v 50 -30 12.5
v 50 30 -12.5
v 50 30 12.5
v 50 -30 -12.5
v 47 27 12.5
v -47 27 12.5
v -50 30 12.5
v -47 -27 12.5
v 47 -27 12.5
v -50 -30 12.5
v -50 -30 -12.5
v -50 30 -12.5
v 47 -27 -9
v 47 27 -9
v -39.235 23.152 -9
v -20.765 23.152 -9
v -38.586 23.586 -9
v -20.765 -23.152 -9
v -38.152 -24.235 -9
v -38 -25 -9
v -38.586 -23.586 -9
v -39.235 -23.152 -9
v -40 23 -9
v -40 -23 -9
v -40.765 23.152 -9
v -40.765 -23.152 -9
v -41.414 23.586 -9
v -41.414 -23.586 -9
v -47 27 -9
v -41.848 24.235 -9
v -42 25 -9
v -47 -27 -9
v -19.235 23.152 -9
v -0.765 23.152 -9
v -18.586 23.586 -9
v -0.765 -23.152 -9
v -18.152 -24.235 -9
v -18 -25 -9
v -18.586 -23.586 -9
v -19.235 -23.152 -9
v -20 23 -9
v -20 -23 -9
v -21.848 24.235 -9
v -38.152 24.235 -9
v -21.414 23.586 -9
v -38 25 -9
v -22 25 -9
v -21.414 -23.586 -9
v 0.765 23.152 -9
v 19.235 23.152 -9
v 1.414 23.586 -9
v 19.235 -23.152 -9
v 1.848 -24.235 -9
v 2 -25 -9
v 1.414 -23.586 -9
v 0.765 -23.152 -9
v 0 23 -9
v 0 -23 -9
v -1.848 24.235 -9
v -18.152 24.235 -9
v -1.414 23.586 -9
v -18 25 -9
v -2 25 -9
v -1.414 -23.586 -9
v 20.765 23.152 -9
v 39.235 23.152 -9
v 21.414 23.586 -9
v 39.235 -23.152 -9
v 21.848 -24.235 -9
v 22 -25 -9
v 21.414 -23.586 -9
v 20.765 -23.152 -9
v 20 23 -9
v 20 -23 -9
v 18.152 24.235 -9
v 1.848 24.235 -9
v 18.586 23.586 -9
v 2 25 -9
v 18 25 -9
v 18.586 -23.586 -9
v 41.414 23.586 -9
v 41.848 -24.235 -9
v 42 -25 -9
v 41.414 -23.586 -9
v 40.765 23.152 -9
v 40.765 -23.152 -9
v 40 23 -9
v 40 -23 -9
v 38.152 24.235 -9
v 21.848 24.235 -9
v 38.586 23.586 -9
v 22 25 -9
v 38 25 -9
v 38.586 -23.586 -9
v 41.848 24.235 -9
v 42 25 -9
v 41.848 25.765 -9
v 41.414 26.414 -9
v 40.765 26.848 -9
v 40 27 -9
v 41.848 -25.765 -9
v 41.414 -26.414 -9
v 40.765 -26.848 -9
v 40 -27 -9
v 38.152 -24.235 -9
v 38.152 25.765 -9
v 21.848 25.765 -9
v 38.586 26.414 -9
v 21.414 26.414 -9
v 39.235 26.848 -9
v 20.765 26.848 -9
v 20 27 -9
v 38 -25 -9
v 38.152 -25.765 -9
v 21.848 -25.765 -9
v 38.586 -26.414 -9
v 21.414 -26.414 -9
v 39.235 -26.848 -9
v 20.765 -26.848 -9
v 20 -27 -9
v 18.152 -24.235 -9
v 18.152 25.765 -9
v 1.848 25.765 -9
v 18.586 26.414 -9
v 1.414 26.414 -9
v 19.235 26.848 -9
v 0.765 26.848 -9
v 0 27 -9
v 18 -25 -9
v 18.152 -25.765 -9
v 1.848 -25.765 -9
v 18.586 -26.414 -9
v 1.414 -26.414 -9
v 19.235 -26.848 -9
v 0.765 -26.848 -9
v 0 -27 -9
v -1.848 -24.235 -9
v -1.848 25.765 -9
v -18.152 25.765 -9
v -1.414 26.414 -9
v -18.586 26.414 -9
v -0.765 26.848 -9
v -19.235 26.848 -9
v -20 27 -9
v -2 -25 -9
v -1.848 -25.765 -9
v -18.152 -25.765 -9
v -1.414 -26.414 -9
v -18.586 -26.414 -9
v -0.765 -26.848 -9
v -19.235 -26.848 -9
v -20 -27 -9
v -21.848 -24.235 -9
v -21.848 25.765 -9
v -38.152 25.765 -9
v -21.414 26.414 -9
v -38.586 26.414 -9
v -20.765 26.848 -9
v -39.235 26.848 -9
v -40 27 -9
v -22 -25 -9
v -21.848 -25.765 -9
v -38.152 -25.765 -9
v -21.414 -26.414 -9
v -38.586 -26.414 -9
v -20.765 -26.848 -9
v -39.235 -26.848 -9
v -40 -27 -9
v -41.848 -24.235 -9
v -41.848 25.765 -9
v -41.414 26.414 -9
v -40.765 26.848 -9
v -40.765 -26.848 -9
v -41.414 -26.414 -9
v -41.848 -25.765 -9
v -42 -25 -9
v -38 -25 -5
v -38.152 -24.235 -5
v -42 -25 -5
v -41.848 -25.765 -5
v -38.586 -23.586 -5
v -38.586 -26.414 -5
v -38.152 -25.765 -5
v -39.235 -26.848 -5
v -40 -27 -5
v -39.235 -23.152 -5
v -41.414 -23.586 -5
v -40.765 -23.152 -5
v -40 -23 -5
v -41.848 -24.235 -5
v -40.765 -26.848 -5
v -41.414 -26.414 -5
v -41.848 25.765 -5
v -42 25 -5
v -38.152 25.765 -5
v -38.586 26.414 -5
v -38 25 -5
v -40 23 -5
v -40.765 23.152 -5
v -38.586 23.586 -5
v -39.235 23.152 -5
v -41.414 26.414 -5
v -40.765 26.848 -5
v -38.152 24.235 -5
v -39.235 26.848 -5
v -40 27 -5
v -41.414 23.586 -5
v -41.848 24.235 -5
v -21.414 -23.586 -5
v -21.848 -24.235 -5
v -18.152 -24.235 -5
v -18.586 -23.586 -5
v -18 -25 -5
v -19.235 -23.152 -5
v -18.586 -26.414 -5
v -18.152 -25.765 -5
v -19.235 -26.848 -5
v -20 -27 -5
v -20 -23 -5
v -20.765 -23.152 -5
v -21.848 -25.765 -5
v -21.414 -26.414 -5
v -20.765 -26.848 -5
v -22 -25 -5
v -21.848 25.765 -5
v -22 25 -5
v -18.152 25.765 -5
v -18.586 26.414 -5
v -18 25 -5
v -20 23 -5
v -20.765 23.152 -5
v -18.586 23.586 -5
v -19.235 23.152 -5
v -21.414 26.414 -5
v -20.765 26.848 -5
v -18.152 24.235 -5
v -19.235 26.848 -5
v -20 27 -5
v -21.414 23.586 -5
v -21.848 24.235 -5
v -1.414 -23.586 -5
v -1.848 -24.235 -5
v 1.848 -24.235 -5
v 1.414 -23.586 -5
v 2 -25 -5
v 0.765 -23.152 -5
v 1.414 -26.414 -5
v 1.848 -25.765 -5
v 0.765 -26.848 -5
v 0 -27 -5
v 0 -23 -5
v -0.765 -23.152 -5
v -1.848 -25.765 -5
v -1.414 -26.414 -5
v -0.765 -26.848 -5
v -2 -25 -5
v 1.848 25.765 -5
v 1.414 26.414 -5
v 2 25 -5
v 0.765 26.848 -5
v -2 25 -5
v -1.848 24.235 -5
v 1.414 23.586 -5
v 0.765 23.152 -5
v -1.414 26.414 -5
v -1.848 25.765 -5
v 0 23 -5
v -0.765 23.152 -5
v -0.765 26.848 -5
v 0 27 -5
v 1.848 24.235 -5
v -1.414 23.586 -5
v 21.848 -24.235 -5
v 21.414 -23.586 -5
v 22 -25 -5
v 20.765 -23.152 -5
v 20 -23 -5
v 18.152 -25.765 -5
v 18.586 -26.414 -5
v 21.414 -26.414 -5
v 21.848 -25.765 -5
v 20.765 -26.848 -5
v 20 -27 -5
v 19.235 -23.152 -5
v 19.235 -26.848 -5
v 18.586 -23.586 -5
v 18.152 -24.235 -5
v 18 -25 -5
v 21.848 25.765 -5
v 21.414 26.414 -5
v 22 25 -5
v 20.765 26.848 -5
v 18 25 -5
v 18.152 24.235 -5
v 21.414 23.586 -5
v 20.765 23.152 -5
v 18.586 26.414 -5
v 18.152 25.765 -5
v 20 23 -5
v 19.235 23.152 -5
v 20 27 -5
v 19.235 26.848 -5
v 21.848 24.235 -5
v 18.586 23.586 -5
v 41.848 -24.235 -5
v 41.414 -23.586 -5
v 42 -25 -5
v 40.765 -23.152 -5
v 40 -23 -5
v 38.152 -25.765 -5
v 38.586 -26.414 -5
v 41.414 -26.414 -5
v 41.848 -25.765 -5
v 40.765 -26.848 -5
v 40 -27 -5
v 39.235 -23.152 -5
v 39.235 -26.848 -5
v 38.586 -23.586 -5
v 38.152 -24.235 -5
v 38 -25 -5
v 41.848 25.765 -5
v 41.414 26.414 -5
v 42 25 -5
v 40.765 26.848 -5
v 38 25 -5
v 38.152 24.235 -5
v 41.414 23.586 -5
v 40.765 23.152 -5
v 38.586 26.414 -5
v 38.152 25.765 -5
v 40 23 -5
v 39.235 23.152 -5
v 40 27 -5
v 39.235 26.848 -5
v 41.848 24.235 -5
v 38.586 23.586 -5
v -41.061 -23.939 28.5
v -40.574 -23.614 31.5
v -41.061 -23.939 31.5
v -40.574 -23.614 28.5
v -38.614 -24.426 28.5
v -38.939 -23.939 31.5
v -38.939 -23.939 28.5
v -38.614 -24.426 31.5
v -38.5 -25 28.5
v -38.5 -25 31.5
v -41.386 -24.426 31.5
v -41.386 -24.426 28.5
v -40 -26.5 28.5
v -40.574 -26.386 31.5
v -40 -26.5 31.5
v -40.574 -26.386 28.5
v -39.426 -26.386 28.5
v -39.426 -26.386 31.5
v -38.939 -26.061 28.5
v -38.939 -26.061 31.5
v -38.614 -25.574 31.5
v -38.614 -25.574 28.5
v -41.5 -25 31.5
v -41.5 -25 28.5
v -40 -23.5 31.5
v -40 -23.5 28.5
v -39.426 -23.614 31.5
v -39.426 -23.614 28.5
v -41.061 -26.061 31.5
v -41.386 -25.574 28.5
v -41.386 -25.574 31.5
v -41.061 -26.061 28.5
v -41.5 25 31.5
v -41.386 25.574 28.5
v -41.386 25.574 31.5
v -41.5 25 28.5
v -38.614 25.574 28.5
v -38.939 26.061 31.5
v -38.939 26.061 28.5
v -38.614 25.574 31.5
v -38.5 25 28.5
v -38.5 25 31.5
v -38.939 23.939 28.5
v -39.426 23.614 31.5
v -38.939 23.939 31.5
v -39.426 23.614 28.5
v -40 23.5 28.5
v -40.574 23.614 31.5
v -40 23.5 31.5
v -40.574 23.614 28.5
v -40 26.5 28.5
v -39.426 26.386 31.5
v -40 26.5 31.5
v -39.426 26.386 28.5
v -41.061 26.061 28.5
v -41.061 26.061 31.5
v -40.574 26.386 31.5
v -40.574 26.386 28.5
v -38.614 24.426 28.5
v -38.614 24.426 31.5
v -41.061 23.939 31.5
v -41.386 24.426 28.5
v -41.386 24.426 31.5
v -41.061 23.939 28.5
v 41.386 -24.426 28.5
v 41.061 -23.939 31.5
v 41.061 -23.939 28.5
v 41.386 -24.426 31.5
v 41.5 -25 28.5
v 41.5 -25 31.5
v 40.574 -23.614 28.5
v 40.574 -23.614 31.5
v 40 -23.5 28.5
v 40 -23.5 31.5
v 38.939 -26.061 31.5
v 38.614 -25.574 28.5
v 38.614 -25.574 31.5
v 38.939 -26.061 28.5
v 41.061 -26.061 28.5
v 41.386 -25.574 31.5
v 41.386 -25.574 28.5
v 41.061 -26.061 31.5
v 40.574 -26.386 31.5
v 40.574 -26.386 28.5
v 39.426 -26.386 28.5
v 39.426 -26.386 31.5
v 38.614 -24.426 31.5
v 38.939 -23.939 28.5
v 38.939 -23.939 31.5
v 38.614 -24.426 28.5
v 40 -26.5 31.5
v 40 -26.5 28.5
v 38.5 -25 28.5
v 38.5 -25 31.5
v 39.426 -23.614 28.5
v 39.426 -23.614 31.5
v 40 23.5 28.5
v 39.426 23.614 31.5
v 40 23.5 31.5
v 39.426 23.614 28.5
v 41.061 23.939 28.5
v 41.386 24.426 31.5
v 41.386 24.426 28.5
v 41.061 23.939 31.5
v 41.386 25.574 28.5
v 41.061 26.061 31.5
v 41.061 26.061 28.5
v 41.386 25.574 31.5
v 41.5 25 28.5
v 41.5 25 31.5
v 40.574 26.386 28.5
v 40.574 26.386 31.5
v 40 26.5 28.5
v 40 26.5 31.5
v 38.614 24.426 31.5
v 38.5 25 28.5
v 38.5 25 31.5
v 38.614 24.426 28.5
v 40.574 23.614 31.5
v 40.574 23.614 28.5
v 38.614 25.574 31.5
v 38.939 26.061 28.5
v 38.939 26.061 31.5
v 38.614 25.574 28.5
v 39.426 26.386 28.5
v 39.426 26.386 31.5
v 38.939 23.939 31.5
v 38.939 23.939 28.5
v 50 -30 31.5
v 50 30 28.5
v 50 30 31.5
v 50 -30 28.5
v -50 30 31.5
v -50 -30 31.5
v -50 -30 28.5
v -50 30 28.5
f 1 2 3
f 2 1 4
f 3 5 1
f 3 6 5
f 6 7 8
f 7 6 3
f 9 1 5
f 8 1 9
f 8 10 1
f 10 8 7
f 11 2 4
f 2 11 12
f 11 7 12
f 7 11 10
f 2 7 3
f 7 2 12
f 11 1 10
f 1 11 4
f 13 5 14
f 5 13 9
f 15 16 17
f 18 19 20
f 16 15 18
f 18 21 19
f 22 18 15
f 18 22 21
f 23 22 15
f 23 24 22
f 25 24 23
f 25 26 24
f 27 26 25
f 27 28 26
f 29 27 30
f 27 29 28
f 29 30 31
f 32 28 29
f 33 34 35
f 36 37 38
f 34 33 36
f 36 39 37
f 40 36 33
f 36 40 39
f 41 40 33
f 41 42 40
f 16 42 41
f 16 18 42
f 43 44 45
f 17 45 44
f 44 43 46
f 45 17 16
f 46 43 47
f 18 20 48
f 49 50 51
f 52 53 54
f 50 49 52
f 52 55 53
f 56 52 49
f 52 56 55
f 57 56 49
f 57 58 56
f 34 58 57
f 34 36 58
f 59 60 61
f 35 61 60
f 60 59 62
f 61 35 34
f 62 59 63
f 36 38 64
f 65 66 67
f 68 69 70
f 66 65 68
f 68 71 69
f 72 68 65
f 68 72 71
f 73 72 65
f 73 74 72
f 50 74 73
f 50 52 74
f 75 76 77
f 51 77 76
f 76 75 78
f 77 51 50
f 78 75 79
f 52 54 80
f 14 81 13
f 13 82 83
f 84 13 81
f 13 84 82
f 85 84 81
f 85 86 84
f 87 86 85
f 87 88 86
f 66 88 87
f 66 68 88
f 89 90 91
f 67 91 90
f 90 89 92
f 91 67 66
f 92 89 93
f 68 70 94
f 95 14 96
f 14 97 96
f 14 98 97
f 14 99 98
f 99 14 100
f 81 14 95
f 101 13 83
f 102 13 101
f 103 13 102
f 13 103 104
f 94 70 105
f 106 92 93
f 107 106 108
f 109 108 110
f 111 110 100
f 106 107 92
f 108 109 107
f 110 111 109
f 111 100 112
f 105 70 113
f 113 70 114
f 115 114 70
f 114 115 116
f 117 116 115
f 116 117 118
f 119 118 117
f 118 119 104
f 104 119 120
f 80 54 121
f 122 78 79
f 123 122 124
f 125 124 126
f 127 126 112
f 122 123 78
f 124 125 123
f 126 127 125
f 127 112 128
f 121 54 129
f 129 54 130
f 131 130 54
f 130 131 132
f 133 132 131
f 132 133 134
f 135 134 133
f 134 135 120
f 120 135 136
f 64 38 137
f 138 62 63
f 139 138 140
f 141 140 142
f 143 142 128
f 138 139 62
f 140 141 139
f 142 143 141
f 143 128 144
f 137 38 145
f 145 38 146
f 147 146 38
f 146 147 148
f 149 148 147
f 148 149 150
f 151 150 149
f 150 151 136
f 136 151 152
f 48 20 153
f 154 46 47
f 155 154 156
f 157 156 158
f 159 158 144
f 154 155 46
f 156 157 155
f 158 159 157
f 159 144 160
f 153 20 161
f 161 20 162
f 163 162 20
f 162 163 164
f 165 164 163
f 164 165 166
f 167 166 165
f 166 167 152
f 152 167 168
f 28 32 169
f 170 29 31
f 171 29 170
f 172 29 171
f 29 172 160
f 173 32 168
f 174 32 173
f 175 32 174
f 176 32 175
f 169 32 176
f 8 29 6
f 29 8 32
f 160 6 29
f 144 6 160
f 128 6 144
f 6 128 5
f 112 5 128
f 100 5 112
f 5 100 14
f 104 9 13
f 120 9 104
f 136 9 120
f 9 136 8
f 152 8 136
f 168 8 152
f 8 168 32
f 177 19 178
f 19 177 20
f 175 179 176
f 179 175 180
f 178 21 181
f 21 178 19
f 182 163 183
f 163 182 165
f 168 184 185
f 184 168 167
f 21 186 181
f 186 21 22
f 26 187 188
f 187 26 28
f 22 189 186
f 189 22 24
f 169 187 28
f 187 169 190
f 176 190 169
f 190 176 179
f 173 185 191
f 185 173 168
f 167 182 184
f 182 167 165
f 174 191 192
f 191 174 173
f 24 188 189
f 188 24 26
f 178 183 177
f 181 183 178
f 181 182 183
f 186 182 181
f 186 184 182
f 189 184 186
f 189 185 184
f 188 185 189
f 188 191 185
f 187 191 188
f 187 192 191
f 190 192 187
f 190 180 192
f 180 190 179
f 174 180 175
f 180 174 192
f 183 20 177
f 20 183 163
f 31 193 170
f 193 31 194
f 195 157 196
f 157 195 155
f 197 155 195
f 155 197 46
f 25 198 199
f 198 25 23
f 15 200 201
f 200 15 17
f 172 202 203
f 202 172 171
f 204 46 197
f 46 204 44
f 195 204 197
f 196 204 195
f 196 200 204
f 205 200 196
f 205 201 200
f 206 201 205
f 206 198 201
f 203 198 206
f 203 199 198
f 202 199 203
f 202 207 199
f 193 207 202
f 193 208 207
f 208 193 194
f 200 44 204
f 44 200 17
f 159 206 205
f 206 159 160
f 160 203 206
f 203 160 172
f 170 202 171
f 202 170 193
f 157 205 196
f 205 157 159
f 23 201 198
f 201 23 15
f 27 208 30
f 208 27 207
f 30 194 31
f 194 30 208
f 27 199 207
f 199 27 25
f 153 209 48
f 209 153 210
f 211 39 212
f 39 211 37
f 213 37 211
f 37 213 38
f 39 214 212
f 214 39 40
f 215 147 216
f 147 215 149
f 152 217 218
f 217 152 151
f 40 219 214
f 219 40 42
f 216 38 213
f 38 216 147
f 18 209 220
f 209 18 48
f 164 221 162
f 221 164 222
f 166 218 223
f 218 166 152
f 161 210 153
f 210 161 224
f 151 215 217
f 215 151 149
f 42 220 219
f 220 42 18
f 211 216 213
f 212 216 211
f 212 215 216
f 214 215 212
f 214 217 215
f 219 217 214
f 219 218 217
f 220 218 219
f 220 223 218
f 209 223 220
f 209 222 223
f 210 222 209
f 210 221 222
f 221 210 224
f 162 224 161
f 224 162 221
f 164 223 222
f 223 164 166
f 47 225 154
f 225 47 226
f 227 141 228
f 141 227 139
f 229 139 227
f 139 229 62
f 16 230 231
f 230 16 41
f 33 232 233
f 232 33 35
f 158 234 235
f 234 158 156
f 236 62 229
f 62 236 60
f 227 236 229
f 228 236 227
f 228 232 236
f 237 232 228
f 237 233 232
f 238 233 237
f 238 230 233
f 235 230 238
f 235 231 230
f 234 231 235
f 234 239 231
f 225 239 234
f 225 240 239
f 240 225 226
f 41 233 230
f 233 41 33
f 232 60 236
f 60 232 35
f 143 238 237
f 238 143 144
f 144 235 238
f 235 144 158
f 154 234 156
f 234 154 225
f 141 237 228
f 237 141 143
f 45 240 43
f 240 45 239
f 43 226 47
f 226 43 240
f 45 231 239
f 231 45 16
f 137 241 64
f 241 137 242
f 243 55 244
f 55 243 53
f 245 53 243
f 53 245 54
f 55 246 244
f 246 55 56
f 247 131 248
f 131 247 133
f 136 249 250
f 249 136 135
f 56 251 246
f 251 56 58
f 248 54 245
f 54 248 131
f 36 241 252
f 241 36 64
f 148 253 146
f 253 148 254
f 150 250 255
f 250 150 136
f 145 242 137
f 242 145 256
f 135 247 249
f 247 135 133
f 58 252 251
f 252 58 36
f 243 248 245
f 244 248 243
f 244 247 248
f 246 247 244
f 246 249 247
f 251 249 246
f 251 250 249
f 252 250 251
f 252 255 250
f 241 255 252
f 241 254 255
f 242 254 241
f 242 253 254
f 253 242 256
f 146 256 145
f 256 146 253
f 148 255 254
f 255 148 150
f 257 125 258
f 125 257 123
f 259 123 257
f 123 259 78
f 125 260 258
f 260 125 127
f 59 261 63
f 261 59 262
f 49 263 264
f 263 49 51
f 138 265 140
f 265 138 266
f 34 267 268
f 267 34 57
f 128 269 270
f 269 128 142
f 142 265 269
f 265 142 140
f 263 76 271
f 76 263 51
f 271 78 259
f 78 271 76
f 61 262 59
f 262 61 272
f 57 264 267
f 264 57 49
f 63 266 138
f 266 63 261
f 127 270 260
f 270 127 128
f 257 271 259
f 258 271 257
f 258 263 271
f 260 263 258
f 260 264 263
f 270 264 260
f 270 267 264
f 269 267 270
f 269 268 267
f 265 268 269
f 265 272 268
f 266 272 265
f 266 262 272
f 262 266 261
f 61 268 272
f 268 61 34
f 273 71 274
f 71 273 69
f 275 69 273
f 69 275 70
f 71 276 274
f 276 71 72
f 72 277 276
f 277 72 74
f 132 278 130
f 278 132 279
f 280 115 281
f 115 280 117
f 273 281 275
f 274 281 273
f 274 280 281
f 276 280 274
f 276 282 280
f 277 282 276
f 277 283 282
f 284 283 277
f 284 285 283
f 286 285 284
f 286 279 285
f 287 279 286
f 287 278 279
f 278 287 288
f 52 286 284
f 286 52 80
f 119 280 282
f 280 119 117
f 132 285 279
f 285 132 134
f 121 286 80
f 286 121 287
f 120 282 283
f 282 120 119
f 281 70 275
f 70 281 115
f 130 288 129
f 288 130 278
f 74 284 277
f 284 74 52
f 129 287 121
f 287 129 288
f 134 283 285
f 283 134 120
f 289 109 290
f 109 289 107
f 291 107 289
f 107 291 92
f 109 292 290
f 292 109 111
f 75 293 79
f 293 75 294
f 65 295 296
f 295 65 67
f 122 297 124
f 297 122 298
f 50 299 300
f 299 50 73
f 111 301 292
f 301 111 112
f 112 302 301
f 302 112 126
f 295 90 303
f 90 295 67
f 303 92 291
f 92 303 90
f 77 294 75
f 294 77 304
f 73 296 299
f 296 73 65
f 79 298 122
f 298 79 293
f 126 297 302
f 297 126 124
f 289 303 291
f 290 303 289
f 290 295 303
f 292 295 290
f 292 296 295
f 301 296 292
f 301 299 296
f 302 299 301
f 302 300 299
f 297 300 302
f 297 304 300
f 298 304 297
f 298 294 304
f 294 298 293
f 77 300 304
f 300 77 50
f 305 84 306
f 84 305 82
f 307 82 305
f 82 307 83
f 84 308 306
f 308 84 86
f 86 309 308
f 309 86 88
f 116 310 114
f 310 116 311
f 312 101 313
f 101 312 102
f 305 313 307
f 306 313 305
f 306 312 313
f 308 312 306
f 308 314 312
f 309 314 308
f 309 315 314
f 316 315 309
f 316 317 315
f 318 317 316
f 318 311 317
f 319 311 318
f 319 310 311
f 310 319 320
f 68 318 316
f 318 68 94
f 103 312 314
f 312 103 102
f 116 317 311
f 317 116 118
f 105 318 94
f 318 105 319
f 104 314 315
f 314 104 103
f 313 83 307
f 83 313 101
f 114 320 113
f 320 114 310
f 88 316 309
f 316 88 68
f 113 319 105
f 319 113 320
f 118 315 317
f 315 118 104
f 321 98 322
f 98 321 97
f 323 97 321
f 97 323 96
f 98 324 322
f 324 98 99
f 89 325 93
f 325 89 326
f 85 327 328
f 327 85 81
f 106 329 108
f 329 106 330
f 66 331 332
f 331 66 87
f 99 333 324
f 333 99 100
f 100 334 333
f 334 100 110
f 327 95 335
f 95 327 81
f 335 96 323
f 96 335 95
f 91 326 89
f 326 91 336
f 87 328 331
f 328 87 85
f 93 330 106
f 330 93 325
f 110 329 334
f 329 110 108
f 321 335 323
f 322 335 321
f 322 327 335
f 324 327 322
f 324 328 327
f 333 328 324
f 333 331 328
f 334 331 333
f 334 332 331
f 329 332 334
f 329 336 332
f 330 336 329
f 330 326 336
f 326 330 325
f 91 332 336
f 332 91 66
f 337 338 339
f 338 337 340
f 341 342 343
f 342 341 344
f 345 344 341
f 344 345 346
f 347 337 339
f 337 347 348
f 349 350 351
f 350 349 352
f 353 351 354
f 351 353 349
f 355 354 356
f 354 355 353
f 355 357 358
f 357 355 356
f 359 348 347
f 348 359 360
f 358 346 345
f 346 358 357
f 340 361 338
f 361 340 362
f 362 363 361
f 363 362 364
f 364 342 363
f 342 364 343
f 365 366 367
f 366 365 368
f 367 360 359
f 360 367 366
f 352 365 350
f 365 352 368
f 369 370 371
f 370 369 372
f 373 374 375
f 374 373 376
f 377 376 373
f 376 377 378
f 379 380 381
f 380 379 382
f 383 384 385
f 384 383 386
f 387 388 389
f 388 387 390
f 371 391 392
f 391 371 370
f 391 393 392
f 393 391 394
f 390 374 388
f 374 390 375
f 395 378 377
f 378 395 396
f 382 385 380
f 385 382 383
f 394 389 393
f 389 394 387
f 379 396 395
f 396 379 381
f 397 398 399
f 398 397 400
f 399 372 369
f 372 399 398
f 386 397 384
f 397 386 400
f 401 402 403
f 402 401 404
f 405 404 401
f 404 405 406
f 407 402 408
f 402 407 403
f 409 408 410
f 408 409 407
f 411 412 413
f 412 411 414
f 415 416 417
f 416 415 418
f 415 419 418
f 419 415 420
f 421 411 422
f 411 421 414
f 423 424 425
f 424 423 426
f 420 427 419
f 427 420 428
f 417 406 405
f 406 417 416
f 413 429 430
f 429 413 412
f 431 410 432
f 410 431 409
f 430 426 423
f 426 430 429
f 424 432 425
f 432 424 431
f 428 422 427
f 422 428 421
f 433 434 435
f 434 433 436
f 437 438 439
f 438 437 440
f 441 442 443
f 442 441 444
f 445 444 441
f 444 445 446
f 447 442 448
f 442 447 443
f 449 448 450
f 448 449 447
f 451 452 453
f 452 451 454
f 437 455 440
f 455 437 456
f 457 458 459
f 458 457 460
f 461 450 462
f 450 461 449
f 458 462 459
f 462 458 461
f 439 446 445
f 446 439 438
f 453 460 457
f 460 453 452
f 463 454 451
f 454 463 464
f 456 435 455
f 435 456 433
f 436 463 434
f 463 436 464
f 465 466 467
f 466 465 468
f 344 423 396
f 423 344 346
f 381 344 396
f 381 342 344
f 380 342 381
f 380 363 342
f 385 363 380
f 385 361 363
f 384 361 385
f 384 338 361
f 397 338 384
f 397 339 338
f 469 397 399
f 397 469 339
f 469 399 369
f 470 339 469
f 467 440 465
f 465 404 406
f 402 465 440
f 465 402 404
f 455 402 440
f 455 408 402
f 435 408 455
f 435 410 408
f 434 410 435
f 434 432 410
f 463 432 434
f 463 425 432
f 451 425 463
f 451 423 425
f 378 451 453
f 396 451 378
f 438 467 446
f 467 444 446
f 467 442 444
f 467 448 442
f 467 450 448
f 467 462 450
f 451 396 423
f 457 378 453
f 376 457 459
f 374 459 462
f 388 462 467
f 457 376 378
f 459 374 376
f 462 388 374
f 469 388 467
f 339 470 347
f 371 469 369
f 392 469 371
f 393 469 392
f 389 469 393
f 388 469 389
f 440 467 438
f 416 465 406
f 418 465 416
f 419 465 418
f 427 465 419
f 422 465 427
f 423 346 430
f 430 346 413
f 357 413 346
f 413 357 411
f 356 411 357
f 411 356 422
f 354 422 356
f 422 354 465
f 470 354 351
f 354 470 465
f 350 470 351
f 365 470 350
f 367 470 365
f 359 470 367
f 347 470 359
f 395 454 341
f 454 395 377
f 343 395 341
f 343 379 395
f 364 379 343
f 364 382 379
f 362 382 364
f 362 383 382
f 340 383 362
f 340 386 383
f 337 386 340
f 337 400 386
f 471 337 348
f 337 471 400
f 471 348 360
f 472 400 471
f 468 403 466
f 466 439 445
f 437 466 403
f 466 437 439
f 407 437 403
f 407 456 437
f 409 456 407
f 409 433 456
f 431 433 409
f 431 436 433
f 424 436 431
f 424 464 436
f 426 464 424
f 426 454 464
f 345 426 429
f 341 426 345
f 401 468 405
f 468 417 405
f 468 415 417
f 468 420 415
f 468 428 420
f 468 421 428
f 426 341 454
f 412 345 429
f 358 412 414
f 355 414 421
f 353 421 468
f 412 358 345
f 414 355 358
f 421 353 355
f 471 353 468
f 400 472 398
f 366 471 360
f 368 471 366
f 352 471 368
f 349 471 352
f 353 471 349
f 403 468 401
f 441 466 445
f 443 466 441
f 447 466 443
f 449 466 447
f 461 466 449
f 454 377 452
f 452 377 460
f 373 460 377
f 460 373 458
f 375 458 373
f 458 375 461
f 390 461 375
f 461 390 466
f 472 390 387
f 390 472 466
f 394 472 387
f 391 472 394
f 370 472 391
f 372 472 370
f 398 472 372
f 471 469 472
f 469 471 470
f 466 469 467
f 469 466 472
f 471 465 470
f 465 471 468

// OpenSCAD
// AkustikMon-6 Lot 6.7
module body() { difference() { cube([100,60,25],center=true); translate([0,0,2]) cube([94,54,22],center=true); } }
module mounts() { for(x=[-40,-20,0,20,40]) { translate([x,-25,-10]) cylinder(h=5,r=2,$fn=16); translate([x,25,-10]) cylinder(h=5,r=2,$fn=16); } }
module lid() { translate([0,0,30]) difference() { cube([100,60,3],center=true); for(x=[-40,40]) for(y=[-25,25]) translate([x,y,0]) cylinder(h=5,r=1.5,center=true,$fn=16); } }
color("SteelBlue") body(); color("Gold") mounts(); color("LightBlue",0.7) lid();
